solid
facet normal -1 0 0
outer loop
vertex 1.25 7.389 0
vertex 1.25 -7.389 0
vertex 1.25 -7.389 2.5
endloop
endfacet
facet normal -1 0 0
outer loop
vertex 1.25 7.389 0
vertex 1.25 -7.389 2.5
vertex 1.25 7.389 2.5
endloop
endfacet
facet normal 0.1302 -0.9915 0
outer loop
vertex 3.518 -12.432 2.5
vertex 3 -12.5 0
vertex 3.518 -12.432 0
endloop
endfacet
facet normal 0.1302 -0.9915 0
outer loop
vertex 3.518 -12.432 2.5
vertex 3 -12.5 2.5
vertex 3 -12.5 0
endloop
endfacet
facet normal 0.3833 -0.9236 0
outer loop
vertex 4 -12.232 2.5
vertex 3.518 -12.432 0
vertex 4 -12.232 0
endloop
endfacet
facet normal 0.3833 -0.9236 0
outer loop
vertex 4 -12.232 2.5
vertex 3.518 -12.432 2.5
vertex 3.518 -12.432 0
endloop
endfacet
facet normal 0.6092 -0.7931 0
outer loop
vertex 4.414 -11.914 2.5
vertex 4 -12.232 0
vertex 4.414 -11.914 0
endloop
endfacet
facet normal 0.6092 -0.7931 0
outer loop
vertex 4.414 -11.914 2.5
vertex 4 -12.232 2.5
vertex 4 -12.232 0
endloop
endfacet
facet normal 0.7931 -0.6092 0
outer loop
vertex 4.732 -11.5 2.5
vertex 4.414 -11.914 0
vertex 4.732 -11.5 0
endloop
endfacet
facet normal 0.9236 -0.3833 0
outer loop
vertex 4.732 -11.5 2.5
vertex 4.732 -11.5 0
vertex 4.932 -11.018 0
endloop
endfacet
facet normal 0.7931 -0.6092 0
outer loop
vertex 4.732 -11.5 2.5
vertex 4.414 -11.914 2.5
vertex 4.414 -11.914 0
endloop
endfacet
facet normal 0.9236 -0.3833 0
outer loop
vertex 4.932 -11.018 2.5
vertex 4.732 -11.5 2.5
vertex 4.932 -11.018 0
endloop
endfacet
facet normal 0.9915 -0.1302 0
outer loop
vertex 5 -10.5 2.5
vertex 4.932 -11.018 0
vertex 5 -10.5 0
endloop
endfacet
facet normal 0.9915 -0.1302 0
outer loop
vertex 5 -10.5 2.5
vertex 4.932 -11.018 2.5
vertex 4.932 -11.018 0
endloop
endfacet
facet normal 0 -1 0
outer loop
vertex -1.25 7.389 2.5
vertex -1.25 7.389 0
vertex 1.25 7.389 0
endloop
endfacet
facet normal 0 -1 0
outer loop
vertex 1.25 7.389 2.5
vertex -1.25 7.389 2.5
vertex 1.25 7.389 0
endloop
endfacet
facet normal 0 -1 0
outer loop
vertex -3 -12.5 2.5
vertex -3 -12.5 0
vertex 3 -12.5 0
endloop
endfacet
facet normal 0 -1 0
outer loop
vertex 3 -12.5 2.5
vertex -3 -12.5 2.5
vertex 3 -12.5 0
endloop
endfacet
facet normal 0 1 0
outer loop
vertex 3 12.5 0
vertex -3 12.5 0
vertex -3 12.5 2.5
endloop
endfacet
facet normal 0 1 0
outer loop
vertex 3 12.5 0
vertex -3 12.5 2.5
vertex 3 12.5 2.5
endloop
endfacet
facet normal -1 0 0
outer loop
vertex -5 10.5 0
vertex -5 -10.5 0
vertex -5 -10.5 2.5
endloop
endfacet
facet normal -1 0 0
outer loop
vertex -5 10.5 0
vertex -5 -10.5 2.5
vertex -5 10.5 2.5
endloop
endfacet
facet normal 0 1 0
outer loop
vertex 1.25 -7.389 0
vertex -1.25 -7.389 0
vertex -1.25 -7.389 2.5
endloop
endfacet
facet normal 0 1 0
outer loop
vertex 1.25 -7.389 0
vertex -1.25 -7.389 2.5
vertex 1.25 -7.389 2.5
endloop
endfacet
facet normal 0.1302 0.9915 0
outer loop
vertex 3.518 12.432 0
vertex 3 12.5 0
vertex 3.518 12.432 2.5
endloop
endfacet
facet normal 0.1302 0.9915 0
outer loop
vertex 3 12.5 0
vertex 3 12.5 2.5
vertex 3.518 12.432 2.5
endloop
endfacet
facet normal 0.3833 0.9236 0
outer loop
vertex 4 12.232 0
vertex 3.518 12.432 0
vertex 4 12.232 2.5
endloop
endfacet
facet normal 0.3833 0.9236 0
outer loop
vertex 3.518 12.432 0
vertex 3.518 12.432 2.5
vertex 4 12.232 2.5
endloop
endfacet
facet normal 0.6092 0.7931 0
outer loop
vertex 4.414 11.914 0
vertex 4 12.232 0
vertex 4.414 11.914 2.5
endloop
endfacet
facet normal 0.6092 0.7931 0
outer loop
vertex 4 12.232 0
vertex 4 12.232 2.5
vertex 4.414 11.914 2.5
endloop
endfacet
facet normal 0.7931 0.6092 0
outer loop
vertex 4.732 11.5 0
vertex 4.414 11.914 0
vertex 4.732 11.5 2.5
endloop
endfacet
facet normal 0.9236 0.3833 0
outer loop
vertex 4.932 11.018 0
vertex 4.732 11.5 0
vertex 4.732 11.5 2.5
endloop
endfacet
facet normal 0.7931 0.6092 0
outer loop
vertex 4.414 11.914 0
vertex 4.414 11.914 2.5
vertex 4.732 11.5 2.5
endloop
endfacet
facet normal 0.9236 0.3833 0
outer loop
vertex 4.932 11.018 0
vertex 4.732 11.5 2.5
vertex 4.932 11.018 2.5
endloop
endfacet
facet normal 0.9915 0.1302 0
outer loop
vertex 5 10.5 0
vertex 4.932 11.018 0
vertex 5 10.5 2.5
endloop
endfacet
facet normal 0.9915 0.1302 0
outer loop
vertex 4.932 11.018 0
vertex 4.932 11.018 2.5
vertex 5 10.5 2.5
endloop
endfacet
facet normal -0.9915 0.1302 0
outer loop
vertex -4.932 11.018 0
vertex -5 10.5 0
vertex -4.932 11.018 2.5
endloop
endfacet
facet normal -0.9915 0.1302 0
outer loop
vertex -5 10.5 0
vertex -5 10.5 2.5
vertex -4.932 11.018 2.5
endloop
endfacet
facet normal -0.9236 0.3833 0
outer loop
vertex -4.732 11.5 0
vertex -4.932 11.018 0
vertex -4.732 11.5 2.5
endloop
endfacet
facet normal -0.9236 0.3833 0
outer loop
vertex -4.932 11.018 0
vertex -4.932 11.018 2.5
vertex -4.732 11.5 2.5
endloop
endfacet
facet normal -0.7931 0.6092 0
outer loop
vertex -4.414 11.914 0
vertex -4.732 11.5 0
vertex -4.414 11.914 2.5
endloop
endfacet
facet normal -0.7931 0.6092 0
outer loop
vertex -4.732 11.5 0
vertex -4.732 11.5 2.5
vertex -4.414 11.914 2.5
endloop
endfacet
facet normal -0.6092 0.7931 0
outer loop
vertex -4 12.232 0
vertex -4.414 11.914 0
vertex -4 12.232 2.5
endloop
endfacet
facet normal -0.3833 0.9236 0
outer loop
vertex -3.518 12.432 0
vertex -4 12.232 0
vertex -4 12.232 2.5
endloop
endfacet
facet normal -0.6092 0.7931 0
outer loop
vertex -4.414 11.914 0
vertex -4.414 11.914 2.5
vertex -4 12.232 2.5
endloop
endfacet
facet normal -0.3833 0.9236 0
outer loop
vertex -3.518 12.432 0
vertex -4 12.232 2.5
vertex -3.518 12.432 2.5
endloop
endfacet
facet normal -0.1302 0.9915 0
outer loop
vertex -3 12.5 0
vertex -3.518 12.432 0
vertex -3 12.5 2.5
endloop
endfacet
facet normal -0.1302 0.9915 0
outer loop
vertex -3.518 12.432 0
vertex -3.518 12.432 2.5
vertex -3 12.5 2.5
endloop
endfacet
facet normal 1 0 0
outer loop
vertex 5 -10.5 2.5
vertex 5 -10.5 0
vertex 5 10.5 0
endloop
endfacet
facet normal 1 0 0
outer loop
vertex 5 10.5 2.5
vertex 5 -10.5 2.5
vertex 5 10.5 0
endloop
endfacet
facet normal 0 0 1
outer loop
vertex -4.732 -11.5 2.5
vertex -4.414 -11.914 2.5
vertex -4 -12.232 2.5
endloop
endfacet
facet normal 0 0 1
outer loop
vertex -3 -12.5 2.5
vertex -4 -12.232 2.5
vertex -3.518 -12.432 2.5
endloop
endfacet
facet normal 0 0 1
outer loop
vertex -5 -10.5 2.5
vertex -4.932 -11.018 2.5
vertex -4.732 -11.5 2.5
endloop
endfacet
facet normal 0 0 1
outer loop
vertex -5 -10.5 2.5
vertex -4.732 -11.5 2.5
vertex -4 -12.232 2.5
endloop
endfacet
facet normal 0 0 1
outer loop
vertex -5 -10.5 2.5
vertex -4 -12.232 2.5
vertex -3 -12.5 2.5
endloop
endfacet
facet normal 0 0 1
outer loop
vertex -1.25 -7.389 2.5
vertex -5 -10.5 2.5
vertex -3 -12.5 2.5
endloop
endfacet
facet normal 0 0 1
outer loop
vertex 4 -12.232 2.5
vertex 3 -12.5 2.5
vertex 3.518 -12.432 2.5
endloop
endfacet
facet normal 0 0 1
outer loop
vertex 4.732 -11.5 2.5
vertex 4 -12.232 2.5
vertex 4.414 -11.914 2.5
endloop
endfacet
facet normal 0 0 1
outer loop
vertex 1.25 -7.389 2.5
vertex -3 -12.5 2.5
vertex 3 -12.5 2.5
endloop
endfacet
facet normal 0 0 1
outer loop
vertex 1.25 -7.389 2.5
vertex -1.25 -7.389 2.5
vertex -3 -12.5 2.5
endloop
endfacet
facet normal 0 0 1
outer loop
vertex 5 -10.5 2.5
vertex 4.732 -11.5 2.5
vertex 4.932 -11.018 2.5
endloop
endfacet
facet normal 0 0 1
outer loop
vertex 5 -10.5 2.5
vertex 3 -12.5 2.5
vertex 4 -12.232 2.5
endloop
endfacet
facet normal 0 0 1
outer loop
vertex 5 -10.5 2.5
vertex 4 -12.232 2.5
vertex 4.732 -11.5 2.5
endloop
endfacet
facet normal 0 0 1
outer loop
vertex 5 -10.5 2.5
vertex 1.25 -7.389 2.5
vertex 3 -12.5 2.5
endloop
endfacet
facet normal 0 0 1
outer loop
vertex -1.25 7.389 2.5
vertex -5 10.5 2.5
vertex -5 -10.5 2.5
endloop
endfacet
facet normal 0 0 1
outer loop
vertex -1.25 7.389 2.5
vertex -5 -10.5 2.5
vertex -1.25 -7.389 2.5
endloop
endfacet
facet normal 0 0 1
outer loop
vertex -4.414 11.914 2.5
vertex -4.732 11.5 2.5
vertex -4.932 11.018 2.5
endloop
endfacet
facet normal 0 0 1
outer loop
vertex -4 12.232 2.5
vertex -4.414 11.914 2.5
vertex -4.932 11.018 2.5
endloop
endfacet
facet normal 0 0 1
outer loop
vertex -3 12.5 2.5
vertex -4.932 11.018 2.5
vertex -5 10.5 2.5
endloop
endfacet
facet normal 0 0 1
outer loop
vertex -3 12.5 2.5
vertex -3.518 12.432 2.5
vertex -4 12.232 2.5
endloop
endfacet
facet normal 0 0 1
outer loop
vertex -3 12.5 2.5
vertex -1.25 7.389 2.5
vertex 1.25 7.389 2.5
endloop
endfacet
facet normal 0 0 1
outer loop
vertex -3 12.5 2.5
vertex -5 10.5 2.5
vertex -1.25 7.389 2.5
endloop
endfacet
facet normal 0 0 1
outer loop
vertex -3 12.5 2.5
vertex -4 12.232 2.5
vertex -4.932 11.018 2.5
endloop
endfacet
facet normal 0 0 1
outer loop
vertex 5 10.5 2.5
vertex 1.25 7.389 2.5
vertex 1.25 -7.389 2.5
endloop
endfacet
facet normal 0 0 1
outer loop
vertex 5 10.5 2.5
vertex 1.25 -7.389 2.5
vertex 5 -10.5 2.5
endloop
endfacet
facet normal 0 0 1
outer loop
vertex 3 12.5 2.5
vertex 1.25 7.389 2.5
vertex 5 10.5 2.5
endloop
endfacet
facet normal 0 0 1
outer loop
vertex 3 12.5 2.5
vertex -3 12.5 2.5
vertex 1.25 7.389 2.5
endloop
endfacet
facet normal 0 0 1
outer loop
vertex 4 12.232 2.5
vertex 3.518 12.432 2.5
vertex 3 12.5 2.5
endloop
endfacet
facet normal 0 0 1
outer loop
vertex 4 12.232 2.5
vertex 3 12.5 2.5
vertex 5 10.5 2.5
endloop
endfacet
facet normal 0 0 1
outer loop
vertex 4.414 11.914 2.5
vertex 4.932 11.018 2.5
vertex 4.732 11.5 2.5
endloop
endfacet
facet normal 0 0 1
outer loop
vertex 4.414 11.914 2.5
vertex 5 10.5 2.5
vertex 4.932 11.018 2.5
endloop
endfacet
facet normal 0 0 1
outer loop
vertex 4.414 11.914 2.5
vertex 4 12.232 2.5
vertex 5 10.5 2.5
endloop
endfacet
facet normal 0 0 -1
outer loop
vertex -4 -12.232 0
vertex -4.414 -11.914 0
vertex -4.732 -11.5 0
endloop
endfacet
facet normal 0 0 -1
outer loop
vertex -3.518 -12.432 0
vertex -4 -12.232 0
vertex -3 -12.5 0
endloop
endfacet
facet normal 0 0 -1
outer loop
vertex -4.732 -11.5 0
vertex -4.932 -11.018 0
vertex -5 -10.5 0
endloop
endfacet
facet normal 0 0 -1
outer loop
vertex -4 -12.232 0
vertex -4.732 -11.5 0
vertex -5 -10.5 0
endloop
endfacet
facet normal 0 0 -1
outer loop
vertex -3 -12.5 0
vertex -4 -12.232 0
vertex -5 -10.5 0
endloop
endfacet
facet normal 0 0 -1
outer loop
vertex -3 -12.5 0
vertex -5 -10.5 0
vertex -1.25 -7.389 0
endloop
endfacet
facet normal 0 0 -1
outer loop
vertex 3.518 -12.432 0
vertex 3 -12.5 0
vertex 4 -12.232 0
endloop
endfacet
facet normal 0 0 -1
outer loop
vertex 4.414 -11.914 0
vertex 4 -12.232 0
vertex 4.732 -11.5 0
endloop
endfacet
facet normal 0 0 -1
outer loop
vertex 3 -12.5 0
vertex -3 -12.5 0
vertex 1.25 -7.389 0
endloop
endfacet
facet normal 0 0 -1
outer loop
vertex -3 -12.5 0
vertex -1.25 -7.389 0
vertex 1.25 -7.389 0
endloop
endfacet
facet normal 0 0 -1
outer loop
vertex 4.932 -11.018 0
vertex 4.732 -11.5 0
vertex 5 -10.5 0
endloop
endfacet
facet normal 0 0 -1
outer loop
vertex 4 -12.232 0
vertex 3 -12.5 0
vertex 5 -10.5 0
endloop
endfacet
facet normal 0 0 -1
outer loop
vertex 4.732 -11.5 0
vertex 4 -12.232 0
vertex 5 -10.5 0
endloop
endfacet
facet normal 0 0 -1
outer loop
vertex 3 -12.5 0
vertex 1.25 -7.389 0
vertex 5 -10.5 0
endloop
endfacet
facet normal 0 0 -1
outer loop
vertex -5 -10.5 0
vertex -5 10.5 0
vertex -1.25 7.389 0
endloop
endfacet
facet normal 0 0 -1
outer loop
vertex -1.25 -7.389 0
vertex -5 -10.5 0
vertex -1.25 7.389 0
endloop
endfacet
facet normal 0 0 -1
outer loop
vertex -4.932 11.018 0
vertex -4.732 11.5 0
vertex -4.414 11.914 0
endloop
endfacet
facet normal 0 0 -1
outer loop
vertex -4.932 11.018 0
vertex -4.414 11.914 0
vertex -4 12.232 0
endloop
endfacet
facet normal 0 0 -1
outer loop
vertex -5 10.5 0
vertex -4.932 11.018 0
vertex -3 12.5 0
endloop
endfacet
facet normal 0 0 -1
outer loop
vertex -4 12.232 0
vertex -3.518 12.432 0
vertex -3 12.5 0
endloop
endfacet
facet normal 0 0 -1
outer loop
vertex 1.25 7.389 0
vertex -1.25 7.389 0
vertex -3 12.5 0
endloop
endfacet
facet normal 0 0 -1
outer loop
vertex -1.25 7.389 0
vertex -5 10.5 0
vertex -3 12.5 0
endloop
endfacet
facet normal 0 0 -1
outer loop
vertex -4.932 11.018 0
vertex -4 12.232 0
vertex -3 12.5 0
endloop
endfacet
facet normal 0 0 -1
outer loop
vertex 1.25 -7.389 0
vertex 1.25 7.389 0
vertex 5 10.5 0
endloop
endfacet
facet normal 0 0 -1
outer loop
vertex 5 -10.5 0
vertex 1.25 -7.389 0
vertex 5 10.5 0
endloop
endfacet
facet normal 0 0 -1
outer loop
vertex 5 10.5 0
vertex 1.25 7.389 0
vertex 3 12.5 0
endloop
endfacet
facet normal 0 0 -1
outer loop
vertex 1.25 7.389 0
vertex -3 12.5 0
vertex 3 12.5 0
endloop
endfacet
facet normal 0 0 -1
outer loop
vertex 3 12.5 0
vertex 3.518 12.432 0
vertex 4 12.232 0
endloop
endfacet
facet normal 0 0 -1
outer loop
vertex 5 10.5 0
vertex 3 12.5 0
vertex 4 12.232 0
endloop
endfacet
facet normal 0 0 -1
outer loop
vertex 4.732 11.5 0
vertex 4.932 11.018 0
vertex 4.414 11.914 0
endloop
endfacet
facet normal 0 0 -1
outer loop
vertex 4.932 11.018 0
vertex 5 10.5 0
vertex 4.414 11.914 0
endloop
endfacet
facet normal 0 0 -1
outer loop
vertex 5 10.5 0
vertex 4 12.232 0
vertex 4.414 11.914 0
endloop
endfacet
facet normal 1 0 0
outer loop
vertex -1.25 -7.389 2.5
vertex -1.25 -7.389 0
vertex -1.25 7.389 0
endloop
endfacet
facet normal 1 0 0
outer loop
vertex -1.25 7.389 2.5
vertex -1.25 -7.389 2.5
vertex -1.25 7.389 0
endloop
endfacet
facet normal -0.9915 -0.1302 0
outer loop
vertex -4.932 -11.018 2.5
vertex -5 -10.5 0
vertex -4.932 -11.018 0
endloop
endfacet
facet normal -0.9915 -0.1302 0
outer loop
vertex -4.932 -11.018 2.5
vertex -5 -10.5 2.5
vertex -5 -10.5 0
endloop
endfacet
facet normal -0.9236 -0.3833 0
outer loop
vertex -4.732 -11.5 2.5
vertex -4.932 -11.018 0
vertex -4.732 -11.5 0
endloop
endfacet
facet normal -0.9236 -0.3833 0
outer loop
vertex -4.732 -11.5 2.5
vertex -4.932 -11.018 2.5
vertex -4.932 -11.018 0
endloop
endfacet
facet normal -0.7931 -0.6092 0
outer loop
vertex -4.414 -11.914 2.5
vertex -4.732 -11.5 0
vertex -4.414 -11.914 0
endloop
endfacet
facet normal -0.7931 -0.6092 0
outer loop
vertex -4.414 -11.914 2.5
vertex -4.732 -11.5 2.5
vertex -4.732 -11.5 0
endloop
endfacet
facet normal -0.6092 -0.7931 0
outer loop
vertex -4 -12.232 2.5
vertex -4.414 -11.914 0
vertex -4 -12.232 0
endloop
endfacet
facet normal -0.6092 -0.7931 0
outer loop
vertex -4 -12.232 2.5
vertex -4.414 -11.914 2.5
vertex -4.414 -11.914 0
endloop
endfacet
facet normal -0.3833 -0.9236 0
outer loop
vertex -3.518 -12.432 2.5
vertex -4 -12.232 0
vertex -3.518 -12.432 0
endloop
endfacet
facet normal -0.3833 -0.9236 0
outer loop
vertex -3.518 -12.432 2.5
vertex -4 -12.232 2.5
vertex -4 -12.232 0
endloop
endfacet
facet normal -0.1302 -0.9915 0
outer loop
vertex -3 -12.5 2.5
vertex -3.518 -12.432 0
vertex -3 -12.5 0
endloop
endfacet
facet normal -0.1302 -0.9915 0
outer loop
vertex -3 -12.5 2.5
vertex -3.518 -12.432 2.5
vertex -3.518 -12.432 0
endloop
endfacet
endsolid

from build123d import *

# Parameters (mm, degrees)
CROQUIS1_W              = 10
CROQUIS1_H              = 25
CROQUIS1_W_2            = 2.5
CROQUIS1_H_2            = 14.7771813
SALIENTE_EXTRUIR1_DEPTH = 2.5
REDONDEO1_R             = 2


with BuildPart() as part:
    # Croquis1 → Saliente-Extruir1 (new body)
    with BuildSketch(Plane.XY):
        Rectangle(CROQUIS1_W, CROQUIS1_H)
        Rectangle(CROQUIS1_W_2, CROQUIS1_H_2, mode=Mode.SUBTRACT)
    extrude(amount=SALIENTE_EXTRUIR1_DEPTH)

    # Redondeo1
    redondeo1_edges = [part.edges().sort_by_distance(p)[0] for p in [
        (5, -12.5, 1.25),
        (-5, -12.5, 1.25),
        (-5, 12.5, 1.25),
        (5, 12.5, 1.25),
    ]]
    fillet(redondeo1_edges, radius=REDONDEO1_R)


solid = part.part
